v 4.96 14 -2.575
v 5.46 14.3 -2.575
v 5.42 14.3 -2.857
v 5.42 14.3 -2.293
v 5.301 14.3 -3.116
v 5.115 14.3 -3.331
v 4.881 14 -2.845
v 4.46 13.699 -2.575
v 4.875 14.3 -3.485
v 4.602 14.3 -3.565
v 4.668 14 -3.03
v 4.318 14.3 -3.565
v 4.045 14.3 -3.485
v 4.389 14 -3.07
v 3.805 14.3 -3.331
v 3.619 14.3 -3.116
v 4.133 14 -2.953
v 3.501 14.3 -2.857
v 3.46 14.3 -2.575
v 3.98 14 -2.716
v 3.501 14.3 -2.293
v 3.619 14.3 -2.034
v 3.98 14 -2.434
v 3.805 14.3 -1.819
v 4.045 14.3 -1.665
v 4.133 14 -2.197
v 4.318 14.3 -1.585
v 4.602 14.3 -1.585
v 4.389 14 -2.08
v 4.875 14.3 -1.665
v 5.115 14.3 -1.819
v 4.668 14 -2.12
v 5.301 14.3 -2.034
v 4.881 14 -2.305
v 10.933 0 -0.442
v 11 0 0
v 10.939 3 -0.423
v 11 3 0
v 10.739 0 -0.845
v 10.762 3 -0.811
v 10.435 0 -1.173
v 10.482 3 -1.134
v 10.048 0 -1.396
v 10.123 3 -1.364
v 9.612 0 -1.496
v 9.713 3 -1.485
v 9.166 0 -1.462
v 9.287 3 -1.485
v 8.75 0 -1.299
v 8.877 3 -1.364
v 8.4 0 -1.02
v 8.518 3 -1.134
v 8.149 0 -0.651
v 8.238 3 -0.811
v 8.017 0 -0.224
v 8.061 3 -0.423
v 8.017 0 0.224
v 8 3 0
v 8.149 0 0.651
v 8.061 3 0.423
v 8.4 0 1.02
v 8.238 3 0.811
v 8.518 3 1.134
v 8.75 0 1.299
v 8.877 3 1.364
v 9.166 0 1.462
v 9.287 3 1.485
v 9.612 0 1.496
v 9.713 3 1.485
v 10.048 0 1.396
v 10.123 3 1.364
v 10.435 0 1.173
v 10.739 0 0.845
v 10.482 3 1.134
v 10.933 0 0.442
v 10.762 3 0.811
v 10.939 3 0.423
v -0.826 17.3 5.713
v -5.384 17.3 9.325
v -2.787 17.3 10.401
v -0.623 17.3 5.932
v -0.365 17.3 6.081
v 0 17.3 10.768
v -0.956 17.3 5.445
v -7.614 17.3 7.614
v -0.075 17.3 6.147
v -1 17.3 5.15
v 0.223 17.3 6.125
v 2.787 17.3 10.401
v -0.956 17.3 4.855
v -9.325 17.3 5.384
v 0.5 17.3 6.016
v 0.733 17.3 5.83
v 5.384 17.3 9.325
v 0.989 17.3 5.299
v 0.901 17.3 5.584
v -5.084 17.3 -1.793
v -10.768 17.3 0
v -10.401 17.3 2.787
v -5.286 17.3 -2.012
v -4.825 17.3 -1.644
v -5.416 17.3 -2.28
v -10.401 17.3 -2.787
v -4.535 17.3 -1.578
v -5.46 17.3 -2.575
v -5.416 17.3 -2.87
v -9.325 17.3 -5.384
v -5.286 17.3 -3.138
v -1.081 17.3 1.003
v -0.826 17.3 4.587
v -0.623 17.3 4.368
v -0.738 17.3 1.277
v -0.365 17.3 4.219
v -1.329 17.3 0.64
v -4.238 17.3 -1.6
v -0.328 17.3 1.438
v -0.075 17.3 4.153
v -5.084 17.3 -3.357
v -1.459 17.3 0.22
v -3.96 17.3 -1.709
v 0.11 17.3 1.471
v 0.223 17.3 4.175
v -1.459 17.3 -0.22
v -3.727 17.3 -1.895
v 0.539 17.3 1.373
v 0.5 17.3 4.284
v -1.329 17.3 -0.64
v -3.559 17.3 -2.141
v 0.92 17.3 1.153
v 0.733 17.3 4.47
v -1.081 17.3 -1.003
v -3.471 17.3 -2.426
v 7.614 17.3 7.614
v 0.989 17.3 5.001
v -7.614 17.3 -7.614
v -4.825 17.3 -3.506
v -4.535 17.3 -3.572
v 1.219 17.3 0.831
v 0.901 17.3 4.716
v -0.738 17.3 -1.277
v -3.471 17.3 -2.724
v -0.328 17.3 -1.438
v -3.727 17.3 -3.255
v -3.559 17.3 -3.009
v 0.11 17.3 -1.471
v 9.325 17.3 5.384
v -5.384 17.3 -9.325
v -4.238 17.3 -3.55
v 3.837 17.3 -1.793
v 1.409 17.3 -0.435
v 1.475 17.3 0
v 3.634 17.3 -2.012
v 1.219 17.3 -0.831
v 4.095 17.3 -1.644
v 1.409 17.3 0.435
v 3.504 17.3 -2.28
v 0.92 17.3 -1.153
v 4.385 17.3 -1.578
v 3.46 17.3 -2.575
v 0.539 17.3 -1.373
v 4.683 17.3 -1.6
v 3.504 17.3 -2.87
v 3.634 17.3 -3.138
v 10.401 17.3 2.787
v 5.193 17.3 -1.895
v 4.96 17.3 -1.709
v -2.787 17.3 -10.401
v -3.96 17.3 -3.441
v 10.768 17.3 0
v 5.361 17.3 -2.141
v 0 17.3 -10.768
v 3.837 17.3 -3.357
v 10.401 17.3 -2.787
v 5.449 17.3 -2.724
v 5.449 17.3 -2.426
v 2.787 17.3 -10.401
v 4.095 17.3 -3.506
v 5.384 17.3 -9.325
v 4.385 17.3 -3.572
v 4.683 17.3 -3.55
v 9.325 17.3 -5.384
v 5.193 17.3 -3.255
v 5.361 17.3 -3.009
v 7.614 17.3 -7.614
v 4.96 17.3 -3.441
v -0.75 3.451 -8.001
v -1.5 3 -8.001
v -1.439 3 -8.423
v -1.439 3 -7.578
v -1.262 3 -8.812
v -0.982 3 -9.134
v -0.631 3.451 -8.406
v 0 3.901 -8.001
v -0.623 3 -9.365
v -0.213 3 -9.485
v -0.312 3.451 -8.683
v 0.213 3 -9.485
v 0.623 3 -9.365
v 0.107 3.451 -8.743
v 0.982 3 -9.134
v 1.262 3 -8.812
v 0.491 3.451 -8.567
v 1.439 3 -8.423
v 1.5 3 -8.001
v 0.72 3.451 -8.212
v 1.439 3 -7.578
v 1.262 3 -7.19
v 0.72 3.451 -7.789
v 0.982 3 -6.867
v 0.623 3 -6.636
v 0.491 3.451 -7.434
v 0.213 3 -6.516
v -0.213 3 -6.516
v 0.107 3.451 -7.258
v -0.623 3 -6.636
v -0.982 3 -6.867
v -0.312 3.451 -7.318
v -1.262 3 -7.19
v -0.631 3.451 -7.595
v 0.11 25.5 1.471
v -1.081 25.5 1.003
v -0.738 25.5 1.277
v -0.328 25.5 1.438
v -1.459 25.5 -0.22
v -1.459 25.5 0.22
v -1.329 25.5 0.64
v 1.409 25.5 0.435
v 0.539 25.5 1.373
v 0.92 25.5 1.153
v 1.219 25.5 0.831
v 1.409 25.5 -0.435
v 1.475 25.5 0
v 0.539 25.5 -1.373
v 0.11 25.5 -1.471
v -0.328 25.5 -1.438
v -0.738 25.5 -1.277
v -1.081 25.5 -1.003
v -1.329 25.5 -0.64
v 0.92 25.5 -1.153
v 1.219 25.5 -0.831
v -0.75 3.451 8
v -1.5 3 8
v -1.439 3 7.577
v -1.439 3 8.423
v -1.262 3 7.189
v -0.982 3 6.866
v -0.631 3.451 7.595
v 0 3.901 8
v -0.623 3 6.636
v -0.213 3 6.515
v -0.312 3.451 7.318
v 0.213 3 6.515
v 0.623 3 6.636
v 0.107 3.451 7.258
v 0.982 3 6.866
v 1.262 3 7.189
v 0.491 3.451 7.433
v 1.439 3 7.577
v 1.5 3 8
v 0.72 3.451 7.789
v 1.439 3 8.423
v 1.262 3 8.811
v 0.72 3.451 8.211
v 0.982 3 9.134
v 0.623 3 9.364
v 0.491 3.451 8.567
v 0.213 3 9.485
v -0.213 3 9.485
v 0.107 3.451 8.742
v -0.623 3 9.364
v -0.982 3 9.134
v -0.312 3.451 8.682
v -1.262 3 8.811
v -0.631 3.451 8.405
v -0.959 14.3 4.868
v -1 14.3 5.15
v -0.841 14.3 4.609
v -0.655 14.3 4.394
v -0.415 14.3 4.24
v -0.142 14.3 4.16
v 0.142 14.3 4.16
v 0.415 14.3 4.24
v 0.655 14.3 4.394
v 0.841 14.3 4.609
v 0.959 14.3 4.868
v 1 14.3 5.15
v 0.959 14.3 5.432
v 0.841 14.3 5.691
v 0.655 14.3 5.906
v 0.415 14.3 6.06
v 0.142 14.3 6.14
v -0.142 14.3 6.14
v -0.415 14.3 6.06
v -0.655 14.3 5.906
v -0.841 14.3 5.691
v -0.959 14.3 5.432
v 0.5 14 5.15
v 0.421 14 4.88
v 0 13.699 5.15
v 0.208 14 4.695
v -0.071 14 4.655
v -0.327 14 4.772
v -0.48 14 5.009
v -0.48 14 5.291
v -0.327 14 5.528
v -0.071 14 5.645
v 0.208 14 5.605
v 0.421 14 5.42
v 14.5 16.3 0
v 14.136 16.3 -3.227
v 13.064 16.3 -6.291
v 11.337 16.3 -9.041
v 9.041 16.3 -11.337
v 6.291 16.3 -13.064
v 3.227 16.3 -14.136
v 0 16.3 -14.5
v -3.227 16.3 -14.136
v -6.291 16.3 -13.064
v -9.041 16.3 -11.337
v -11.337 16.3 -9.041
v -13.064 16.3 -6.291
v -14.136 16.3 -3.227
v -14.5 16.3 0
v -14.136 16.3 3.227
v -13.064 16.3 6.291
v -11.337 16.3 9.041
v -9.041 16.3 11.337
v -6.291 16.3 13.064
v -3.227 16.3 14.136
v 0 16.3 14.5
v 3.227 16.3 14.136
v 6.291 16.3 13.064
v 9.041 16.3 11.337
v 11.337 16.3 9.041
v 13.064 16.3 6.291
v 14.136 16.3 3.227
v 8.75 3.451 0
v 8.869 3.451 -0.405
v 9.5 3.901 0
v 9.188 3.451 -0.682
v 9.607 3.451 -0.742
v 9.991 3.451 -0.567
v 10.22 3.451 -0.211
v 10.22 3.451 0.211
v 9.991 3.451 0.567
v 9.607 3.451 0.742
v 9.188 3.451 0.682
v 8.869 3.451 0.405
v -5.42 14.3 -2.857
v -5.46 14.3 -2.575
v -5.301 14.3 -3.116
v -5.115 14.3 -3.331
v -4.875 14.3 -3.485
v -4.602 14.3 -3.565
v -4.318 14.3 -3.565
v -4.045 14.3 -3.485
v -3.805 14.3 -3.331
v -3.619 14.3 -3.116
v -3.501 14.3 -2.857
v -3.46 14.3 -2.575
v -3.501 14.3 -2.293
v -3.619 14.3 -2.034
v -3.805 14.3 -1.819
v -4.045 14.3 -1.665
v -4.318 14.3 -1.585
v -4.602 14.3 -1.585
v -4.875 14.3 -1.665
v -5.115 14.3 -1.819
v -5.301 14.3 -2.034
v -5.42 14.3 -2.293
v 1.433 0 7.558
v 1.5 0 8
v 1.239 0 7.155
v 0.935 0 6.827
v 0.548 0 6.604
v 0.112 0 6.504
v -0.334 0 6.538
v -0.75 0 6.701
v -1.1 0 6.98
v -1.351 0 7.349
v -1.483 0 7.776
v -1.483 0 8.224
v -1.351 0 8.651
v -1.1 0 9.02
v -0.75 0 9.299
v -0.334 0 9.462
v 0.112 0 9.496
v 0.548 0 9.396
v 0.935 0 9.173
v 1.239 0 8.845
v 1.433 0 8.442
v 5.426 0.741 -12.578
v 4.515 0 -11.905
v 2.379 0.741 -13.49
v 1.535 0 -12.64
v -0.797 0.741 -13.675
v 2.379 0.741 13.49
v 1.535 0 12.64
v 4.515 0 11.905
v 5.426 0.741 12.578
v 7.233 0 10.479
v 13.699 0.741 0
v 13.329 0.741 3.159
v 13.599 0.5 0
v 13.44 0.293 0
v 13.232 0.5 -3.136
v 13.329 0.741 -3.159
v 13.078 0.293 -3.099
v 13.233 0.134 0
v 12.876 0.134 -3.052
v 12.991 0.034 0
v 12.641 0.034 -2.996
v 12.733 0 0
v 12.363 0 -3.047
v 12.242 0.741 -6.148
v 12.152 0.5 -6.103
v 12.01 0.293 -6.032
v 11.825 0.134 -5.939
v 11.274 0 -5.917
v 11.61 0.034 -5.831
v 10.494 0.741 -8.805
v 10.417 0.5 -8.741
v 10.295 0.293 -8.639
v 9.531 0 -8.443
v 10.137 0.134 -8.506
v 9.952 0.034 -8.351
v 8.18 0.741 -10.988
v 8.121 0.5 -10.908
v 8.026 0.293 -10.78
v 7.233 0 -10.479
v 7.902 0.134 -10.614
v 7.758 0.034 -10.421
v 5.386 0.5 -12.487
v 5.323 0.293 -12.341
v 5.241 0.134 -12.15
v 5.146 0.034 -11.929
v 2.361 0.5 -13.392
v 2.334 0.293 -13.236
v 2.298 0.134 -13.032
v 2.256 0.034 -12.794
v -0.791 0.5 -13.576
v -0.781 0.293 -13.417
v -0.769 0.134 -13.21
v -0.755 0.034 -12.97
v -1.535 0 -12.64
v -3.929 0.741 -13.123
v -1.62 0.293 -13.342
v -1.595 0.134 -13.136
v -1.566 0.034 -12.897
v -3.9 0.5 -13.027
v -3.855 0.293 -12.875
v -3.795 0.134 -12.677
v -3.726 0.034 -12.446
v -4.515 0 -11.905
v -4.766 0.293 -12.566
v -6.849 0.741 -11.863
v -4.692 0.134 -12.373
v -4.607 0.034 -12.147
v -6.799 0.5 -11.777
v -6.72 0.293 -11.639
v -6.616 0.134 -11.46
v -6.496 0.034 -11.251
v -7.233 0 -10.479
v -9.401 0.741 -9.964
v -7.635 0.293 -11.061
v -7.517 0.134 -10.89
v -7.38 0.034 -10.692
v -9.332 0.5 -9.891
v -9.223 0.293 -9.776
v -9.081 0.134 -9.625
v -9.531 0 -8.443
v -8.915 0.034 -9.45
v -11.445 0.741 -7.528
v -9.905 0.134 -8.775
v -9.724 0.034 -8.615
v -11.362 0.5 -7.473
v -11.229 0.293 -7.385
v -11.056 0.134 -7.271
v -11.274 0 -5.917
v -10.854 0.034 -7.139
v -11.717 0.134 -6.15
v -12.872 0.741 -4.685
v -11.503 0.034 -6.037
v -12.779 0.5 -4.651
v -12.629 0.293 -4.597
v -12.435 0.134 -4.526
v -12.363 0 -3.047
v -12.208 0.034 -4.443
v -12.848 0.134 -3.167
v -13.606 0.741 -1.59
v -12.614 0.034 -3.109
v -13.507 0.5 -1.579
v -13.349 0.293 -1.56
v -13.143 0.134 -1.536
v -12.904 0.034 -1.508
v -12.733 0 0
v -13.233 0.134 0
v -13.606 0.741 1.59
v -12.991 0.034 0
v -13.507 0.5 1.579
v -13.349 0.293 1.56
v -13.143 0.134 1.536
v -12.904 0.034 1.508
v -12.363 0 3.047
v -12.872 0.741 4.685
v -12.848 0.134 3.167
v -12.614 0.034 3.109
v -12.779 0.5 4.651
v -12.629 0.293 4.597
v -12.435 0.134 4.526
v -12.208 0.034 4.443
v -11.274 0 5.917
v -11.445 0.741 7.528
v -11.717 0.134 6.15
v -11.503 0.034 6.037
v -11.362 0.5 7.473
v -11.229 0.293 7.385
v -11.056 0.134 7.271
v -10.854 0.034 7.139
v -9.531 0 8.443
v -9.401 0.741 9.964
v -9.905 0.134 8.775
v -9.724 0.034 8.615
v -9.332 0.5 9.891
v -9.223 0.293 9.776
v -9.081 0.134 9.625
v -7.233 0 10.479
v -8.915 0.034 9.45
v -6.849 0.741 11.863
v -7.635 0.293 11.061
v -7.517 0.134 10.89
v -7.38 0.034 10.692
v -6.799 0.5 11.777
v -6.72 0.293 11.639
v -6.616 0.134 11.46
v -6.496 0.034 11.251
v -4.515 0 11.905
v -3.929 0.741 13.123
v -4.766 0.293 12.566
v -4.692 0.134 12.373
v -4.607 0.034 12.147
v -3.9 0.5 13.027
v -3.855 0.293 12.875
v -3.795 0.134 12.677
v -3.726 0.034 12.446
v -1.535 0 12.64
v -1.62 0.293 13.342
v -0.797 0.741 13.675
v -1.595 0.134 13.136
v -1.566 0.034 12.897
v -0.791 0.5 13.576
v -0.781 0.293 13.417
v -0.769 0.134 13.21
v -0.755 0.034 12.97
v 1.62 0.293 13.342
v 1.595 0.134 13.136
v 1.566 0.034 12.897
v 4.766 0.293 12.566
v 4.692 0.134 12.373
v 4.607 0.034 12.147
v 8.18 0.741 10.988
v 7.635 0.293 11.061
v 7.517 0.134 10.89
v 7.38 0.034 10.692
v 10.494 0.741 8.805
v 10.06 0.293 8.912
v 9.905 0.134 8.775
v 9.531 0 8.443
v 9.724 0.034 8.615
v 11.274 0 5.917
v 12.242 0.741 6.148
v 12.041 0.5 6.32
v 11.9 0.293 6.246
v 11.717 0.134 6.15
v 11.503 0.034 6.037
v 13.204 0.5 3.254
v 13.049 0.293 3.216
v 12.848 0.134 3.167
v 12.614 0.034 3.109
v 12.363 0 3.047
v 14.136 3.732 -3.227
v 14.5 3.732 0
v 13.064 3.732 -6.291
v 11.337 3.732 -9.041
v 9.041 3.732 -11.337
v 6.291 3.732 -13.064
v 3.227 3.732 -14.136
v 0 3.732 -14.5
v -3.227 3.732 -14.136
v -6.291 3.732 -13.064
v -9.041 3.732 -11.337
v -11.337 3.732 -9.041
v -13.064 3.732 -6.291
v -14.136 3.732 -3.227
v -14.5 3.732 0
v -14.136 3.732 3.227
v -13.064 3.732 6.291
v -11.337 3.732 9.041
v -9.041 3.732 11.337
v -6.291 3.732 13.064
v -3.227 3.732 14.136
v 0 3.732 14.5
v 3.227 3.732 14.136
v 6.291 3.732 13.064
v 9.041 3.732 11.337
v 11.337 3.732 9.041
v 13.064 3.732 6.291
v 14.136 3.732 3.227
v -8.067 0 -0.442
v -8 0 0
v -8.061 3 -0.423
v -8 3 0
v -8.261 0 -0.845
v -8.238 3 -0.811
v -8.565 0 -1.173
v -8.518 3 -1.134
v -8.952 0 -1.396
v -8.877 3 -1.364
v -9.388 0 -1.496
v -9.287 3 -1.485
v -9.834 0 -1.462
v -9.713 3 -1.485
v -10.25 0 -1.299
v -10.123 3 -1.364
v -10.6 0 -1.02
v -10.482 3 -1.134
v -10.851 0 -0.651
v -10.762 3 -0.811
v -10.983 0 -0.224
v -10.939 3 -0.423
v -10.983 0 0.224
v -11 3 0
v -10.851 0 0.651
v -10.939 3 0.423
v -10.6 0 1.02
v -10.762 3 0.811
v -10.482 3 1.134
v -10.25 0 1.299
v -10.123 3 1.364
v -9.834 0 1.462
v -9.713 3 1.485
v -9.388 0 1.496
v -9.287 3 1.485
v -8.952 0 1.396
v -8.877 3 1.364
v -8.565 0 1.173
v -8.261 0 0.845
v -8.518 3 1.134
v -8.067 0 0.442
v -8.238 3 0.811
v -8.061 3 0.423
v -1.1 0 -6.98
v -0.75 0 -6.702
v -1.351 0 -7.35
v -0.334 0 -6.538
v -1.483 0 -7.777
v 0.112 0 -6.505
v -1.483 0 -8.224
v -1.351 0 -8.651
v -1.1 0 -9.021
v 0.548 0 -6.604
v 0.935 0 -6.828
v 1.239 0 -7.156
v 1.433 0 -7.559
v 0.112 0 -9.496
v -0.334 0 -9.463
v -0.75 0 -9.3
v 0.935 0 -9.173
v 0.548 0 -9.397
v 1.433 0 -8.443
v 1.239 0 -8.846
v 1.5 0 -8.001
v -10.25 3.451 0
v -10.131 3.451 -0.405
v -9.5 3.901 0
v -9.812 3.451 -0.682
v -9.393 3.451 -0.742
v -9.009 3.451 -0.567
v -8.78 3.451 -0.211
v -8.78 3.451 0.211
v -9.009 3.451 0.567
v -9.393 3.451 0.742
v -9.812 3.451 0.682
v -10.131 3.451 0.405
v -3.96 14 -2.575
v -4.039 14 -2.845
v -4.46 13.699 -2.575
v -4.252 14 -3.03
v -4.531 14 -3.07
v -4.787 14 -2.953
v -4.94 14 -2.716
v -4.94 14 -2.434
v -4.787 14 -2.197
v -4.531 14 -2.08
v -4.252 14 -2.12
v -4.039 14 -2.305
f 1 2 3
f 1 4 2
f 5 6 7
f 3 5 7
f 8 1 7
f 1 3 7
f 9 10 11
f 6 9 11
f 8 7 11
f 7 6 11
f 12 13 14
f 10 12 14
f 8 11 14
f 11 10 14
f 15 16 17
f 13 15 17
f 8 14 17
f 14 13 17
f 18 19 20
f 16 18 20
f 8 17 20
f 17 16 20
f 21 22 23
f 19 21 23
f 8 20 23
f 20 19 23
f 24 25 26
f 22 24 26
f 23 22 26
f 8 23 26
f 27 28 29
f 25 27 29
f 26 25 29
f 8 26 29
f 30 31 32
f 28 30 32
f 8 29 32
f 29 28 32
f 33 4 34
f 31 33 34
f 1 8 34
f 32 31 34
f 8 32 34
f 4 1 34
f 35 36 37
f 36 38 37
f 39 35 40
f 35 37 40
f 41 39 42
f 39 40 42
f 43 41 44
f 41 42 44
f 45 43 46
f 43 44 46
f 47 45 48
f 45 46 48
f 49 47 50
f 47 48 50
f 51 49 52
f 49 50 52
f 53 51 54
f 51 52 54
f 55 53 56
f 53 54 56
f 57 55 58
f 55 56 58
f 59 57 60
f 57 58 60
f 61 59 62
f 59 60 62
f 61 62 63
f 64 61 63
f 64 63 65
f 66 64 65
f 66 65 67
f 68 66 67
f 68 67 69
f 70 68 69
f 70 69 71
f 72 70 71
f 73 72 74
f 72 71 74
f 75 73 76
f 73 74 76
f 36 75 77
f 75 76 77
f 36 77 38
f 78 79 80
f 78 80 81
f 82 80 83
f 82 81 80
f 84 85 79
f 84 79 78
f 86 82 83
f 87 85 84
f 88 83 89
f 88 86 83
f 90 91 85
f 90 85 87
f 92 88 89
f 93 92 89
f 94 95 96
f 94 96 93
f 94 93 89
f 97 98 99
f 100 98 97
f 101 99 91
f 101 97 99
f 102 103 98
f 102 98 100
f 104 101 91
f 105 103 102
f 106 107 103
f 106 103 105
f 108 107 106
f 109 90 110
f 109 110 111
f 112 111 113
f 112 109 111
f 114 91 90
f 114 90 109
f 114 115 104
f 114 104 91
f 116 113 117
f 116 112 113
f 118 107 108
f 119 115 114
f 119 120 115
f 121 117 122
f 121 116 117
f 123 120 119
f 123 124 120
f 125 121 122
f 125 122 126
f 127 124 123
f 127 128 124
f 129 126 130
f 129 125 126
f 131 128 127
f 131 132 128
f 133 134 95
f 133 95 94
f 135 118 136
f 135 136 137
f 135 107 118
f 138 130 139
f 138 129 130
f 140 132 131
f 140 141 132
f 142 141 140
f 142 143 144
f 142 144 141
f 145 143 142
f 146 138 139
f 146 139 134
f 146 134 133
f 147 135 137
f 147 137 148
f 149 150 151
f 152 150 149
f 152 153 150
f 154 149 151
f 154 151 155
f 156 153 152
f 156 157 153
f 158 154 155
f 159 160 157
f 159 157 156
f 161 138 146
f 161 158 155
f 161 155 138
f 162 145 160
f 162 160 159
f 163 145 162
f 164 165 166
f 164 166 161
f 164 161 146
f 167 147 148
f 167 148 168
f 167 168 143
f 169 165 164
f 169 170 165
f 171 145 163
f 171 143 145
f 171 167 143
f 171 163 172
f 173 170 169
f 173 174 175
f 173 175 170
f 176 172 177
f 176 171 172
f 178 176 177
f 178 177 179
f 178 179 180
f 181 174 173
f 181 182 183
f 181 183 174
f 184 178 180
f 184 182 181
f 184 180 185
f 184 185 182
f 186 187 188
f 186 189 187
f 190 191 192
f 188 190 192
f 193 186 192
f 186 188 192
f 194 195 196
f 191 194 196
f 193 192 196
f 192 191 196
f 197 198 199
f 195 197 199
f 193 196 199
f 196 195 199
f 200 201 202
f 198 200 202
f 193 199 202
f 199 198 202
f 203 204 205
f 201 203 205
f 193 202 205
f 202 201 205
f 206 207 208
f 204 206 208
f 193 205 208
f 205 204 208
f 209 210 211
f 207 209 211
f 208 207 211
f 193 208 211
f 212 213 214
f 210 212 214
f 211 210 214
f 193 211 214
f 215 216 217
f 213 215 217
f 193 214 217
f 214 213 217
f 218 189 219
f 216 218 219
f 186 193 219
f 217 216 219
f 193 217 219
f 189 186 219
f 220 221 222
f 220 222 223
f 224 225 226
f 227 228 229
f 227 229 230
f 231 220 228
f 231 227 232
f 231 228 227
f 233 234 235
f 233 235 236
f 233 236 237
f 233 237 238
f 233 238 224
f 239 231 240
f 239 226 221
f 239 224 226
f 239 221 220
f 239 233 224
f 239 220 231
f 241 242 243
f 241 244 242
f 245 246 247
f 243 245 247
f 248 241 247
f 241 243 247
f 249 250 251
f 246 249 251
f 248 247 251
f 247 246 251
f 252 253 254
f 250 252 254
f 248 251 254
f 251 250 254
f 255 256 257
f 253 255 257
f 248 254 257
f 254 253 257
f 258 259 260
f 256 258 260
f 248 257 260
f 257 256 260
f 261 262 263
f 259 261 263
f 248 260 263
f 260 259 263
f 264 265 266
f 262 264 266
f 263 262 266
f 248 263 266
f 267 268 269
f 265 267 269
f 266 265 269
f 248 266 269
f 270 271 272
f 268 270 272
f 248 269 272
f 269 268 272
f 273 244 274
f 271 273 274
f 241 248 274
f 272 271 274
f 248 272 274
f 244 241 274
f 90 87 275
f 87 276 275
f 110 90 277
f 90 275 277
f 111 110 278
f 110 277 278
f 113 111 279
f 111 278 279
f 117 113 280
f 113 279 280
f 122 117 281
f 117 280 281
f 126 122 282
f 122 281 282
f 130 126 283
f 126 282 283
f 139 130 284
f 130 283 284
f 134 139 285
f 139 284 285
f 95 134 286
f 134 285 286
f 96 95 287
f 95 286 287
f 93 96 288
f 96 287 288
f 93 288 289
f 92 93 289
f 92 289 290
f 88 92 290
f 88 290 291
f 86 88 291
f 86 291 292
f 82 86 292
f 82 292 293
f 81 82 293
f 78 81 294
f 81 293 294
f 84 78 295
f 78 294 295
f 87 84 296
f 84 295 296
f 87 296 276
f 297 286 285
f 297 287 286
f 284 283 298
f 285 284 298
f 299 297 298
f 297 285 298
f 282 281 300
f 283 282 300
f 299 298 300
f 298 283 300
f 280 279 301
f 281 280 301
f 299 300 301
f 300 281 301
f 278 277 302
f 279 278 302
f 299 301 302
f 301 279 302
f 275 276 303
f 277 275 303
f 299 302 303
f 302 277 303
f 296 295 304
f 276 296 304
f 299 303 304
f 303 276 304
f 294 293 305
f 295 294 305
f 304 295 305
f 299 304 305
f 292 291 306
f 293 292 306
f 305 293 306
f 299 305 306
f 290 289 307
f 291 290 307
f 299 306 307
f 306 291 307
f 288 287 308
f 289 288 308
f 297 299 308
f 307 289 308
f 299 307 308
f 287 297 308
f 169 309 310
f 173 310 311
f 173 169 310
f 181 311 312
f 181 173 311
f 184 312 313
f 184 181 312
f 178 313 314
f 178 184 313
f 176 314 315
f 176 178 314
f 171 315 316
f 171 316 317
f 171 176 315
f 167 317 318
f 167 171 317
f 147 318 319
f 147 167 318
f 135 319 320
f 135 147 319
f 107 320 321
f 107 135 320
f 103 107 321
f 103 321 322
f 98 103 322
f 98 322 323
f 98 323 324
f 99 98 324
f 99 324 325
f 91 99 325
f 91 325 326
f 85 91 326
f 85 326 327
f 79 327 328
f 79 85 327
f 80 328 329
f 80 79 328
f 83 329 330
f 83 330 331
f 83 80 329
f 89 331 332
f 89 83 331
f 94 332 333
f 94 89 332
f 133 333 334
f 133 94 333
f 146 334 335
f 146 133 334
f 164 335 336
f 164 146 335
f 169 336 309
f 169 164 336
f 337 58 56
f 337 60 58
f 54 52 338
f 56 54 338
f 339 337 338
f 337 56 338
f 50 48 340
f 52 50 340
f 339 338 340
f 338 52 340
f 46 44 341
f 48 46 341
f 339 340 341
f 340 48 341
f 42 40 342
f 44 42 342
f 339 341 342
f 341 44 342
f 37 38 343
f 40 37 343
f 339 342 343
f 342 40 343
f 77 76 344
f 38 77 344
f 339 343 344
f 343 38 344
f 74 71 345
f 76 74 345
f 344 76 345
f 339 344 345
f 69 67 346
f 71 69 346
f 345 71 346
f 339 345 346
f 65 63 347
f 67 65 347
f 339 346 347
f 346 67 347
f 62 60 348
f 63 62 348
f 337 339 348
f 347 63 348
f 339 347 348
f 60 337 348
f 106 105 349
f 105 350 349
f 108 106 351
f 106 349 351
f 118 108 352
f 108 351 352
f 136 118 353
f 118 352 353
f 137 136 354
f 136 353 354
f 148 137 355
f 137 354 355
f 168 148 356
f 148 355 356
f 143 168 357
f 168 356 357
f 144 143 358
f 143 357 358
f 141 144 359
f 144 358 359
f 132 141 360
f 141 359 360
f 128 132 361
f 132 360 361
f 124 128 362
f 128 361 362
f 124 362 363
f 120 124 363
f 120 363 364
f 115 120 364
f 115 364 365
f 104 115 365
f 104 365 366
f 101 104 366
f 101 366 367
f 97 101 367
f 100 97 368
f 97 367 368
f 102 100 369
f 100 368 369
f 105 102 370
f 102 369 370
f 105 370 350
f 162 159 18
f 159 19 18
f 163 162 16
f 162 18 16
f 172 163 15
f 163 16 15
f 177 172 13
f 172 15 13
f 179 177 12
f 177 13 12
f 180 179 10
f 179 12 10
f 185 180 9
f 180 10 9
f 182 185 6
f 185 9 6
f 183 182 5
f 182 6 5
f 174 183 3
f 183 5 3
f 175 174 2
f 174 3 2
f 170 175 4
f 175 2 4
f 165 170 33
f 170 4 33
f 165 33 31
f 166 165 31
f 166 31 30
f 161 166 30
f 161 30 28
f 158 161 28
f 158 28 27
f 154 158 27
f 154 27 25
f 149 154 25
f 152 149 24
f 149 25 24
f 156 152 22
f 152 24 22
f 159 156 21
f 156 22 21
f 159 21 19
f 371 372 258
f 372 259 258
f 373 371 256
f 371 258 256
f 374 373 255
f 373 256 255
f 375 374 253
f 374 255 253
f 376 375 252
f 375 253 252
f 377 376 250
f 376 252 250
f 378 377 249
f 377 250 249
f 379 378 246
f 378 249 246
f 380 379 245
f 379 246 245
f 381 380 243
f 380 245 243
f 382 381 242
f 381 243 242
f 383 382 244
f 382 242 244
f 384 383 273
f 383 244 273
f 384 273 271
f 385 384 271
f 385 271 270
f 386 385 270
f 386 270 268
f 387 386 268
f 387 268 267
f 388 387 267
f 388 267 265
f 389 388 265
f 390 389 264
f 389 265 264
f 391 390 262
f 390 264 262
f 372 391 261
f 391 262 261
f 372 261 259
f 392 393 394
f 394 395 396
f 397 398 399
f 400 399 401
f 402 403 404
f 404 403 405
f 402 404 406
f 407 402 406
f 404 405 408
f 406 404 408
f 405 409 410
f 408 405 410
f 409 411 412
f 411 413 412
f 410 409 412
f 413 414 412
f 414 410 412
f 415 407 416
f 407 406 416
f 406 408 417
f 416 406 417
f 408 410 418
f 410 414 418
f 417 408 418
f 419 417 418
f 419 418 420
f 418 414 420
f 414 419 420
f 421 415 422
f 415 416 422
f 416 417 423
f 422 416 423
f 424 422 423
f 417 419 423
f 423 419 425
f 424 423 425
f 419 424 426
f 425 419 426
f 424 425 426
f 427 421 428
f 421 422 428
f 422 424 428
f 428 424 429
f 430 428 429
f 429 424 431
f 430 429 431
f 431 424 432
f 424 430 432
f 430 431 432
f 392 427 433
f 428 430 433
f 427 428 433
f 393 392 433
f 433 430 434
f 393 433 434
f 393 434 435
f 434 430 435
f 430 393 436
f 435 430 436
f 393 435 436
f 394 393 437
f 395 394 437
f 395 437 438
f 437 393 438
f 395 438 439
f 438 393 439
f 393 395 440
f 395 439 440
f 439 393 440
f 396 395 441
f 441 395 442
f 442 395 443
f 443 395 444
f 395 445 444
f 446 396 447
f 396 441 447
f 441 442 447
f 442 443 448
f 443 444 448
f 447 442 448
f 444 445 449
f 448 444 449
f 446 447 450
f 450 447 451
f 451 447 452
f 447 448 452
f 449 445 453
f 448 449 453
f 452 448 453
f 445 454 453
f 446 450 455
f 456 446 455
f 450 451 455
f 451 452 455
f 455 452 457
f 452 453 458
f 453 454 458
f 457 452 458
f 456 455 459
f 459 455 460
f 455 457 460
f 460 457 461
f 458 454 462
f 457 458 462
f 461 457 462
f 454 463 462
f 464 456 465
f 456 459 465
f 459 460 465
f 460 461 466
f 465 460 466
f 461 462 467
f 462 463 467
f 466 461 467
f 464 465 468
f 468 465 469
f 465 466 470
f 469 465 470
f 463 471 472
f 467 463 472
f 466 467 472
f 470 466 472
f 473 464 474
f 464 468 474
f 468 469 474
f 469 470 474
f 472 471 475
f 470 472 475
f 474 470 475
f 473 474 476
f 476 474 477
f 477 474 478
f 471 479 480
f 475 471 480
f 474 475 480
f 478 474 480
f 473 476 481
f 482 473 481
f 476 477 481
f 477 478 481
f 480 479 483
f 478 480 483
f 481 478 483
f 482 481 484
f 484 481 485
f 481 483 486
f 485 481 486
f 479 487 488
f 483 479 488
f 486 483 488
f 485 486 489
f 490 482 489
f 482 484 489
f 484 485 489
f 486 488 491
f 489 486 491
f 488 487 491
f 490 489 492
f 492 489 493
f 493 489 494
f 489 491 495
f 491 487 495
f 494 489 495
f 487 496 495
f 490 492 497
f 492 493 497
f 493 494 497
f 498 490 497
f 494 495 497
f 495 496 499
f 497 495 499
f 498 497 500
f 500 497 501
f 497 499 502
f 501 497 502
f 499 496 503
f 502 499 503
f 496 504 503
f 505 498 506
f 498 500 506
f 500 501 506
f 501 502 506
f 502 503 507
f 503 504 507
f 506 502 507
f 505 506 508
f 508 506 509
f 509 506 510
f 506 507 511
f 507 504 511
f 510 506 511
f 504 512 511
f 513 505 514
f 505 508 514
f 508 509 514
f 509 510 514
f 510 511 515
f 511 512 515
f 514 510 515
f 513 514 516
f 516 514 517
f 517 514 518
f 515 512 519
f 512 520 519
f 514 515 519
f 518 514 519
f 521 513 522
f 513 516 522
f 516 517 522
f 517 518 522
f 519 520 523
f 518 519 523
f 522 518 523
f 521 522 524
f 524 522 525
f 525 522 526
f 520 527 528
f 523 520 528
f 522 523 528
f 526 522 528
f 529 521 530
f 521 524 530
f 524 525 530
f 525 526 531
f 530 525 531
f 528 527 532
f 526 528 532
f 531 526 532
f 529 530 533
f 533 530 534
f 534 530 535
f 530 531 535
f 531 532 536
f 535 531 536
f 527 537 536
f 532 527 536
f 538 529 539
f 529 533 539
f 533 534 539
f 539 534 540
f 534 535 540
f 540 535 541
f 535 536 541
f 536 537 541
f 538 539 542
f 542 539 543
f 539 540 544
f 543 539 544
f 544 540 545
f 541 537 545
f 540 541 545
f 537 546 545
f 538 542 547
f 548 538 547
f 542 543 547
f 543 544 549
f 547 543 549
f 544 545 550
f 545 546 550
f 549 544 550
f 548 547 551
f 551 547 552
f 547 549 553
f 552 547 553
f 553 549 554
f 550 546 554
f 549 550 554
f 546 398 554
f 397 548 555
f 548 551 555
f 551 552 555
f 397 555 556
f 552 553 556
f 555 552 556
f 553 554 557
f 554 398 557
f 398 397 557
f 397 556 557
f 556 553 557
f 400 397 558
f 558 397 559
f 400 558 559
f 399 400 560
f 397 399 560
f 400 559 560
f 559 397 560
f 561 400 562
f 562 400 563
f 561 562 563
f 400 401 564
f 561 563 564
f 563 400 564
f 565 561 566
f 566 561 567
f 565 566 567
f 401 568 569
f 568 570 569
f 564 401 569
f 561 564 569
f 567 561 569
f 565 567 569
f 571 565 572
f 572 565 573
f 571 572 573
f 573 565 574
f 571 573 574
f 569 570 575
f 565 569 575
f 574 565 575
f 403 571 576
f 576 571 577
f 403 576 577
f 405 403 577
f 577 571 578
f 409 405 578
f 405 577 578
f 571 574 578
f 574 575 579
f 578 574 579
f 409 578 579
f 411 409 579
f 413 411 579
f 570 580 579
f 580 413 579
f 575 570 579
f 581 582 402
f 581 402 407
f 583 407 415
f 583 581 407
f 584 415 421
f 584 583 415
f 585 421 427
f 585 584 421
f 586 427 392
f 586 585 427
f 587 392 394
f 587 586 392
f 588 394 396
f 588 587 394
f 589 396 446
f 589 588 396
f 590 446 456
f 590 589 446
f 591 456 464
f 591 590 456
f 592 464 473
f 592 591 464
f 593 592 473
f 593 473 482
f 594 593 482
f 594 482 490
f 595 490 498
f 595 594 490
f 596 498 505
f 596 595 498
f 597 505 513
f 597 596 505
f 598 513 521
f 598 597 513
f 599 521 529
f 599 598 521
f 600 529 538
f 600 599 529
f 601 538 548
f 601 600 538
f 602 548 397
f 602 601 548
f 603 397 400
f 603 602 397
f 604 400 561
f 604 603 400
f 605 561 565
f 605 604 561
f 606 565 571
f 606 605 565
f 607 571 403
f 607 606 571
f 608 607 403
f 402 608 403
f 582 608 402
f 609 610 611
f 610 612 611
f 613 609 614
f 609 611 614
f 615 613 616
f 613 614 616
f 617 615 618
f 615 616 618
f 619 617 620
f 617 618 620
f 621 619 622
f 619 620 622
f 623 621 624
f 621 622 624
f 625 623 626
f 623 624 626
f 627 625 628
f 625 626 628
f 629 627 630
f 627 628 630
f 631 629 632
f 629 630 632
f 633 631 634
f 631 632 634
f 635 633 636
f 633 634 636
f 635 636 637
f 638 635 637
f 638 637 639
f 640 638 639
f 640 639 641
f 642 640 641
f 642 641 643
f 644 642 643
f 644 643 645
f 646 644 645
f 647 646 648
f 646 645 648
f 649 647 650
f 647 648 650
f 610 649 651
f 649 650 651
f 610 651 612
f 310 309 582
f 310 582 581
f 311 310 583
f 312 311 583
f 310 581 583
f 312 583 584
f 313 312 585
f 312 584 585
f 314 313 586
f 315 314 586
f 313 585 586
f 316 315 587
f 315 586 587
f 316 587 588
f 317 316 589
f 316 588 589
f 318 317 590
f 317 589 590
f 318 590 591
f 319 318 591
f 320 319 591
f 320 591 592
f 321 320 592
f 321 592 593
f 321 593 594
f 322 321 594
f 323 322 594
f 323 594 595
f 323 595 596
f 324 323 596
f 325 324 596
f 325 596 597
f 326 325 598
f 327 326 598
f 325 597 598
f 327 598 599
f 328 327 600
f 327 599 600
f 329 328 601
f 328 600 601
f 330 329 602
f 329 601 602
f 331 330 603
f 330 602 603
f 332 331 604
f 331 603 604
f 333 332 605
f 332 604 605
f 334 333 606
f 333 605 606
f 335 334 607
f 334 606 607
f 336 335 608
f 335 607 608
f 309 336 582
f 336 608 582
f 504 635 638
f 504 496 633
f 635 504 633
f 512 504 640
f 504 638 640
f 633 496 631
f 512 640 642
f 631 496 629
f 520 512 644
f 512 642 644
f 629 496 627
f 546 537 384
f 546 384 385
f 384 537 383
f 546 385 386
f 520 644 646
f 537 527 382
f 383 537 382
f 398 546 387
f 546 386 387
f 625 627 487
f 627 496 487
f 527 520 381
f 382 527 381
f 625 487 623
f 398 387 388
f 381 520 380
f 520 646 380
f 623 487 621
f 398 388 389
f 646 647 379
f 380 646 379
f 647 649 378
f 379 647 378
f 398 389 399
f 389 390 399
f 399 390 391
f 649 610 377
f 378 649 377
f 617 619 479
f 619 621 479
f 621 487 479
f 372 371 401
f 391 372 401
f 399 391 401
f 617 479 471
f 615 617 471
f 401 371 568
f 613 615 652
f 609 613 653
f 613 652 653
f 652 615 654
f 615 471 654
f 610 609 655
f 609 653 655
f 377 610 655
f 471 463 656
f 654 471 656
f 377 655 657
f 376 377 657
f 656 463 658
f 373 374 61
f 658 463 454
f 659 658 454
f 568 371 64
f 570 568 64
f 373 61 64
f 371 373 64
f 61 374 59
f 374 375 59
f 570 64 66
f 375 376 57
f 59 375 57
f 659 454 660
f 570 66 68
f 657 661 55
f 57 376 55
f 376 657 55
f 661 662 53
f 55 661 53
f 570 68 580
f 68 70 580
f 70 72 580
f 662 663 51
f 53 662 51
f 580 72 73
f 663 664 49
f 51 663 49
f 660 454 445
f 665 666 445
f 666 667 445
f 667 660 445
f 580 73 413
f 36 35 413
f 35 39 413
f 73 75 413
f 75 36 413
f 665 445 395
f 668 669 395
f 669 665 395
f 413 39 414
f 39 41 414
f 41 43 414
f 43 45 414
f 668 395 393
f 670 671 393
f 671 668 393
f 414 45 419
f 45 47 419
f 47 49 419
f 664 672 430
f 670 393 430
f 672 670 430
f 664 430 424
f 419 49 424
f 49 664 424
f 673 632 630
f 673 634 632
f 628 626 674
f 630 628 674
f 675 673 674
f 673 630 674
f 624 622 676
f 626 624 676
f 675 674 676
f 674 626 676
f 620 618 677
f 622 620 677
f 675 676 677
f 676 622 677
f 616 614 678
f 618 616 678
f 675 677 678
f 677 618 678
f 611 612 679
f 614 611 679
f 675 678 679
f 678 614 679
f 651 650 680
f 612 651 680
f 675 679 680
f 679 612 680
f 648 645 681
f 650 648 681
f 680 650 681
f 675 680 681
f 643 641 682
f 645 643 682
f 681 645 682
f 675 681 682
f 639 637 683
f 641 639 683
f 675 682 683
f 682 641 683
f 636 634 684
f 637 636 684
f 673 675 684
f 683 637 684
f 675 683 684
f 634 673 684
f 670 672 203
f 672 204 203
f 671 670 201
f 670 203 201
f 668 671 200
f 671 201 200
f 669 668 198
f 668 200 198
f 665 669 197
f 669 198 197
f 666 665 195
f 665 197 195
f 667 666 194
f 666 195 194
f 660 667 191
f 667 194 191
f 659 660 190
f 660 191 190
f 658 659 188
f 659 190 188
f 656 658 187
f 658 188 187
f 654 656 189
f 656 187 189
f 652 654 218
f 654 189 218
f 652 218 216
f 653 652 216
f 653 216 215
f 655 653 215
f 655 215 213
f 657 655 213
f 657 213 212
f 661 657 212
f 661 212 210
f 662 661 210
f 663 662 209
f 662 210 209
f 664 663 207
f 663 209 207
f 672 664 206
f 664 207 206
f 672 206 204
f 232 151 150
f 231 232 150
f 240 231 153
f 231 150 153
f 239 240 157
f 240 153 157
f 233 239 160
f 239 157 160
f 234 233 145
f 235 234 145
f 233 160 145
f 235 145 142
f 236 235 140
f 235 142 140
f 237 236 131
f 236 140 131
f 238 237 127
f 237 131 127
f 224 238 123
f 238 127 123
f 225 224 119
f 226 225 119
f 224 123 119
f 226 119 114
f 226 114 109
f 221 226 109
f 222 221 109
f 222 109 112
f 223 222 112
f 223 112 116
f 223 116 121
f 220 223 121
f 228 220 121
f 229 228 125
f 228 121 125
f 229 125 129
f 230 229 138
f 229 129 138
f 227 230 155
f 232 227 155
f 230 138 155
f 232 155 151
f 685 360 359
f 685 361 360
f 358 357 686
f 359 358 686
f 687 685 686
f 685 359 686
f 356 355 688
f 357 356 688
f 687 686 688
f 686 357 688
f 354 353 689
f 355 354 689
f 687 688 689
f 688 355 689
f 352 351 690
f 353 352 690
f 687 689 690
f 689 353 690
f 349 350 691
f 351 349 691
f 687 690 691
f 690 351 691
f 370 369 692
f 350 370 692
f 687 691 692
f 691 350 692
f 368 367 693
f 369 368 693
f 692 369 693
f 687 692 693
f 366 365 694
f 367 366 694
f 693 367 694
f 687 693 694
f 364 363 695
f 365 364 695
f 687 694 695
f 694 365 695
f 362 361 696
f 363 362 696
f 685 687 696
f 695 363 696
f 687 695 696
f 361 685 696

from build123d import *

# Parameters (mm, degrees)
SKETCH_1_R           = 14.5
EXTRUDE_1_DEPTH      = 17.3
SKETCH_2_R           = 1.475
EXTRUDE_2_DEPTH      = 8.2
MM_CLEARANCE_1_D     = 3
MM_CLEARANCE_1_DEPTH = 3
MM_CLEARANCE_1_TIP   = 0.901290929
CHAMFER_1_SIZE       = 1
CHAMFER_1_SIZE2      = 3.732050808
FILLET_1_R           = 1
CHAMFER_2_SIZE       = 1
CHAMFER_2_SIZE2      = 3.732050808
MM_CLEARANCE_2_D     = 2
MM_CLEARANCE_2_DEPTH = 3
MM_CLEARANCE_2_TIP   = 0.600860619


with BuildPart() as part:
    # 草图1 → 凸台-拉伸1 (new body)
    with BuildSketch(Plane(origin=(0, 0, 0), x_dir=(1, 0, 0), z_dir=(0, 1, 0))):
        Circle(SKETCH_1_R)
    extrude(amount=EXTRUDE_1_DEPTH)

    # 草图2 → 凸台-拉伸2 (add)
    with BuildSketch(Plane(origin=(0, 17.3, 0), x_dir=(1, 0, 0), z_dir=(0, 1, 0))):
        Circle(SKETCH_2_R)
    extrude(amount=EXTRUDE_2_DEPTH)

    # 大小mm Clearance 暗销槽口1
    with Locations(Plane(origin=(0, 0, 0), x_dir=(-1, 0, 0), z_dir=(0, -1, 0))):
        with Locations((0, -8), (9.5, 0), (0, 8.000635696), (-9.5, 0)):
            Hole(MM_CLEARANCE_1_D / 2, depth=MM_CLEARANCE_1_DEPTH)
            with Locations((0, 0, -(MM_CLEARANCE_1_DEPTH + MM_CLEARANCE_1_TIP / 2))):  # 118° drill point
                Cone(0, MM_CLEARANCE_1_D / 2, MM_CLEARANCE_1_TIP, mode=Mode.SUBTRACT)

    # 倒角1
    chamfer_1_edges = [part.edges().sort_by_distance(p)[0] for p in [
        (-14.5, 0, 0),
    ]]
    chamfer_1_side = [part.faces().sort_by_distance(p)[0] for p in [
        (0, 0, 7.107e-06),
    ]]
    chamfer(chamfer_1_edges, length=CHAMFER_1_SIZE, length2=CHAMFER_1_SIZE2, reference=chamfer_1_side[0])

    # 圆角1
    fillet_1_edges = [part.edges().sort_by_distance(p)[0] for p in [
        (-13.5, 0, 0),
    ]]
    fillet(fillet_1_edges, radius=FILLET_1_R)

    # 倒角2
    chamfer_2_edges = [part.edges().sort_by_distance(p)[0] for p in [
        (-14.5, 17.3, 0),
    ]]
    chamfer_2_side = [part.faces().sort_by_distance(p)[0] for p in [
        (-14.5, 10.516025404, 0),
    ]]
    chamfer(chamfer_2_edges, length=CHAMFER_2_SIZE, length2=CHAMFER_2_SIZE2, reference=chamfer_2_side[0])

    # 大小mm Clearance 暗销槽口2
    with Locations(Plane(origin=(0, 17.3, 0), x_dir=(1, 0, 0), z_dir=(0, 1, 0))):
        with Locations((-4.460030829, 2.575), (4.460030829, 2.575), (0, -5.15)):
            Hole(MM_CLEARANCE_2_D / 2, depth=MM_CLEARANCE_2_DEPTH)
            with Locations((0, 0, -(MM_CLEARANCE_2_DEPTH + MM_CLEARANCE_2_TIP / 2))):  # 118° drill point
                Cone(0, MM_CLEARANCE_2_D / 2, MM_CLEARANCE_2_TIP, mode=Mode.SUBTRACT)


solid = part.part
